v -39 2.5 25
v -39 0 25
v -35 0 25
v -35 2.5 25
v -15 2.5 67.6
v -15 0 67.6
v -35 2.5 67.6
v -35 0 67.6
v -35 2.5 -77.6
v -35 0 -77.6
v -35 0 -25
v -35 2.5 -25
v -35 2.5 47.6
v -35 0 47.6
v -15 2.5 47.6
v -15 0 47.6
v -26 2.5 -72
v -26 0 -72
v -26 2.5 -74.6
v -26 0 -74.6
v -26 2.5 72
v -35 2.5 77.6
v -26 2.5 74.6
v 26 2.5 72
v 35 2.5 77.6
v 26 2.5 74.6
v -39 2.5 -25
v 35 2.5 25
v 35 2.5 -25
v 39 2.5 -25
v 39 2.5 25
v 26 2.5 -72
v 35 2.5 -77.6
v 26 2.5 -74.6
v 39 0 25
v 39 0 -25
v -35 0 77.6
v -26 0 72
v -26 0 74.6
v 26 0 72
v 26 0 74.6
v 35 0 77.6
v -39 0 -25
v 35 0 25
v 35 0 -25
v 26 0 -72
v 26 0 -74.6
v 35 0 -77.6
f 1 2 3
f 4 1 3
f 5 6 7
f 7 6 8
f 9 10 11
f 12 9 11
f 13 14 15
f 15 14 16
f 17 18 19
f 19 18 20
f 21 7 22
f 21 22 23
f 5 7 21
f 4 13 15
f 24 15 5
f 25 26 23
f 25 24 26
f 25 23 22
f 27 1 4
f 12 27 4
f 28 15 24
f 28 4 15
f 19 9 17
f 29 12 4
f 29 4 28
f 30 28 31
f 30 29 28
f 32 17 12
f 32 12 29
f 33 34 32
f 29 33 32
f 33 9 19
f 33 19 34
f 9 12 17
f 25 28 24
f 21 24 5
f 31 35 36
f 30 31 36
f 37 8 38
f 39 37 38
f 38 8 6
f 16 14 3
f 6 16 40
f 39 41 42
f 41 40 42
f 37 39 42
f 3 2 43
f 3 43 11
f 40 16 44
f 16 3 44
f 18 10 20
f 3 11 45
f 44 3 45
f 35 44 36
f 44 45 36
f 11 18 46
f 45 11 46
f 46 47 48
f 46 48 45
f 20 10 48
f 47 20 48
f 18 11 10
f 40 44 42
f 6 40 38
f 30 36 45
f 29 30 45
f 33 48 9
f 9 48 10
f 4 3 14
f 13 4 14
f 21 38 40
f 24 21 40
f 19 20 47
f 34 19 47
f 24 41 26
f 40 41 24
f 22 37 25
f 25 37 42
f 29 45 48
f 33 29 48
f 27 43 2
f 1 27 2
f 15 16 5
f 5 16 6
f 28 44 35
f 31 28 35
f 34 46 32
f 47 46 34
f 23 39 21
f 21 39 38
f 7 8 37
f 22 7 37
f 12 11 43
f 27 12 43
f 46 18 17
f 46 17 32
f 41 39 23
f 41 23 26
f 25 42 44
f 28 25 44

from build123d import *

# Parameters (mm, degrees)
SKETCH2_W           = 52
SKETCH2_H           = 2.6
BOSS_EXTRUDE1_DEPTH = 2.5


with BuildPart() as part:
    # Sketch2 → Boss-Extrude1 (new body)
    with BuildSketch(Plane(origin=(0, 0, 0), x_dir=(1, 0, 0), z_dir=(0, 1, 0))):
        Polygon((35, 25), (35, 77.6), (-35, 77.6), (-35, 25), (-39, 25), (-39, -25), (-35, -25), (-35, -47.6), (-15, -47.6), (-15, -67.6), (-35, -67.6), (-35, -77.6), (35, -77.6), (35, -25), (39, -25), (39, 25), align=None)
        with Locations((0, 73.3)):
            Rectangle(SKETCH2_W, SKETCH2_H, mode=Mode.SUBTRACT)
        with Locations((0, -73.3)):
            Rectangle(SKETCH2_W, SKETCH2_H, mode=Mode.SUBTRACT)
    extrude(amount=BOSS_EXTRUDE1_DEPTH)


solid = part.part
